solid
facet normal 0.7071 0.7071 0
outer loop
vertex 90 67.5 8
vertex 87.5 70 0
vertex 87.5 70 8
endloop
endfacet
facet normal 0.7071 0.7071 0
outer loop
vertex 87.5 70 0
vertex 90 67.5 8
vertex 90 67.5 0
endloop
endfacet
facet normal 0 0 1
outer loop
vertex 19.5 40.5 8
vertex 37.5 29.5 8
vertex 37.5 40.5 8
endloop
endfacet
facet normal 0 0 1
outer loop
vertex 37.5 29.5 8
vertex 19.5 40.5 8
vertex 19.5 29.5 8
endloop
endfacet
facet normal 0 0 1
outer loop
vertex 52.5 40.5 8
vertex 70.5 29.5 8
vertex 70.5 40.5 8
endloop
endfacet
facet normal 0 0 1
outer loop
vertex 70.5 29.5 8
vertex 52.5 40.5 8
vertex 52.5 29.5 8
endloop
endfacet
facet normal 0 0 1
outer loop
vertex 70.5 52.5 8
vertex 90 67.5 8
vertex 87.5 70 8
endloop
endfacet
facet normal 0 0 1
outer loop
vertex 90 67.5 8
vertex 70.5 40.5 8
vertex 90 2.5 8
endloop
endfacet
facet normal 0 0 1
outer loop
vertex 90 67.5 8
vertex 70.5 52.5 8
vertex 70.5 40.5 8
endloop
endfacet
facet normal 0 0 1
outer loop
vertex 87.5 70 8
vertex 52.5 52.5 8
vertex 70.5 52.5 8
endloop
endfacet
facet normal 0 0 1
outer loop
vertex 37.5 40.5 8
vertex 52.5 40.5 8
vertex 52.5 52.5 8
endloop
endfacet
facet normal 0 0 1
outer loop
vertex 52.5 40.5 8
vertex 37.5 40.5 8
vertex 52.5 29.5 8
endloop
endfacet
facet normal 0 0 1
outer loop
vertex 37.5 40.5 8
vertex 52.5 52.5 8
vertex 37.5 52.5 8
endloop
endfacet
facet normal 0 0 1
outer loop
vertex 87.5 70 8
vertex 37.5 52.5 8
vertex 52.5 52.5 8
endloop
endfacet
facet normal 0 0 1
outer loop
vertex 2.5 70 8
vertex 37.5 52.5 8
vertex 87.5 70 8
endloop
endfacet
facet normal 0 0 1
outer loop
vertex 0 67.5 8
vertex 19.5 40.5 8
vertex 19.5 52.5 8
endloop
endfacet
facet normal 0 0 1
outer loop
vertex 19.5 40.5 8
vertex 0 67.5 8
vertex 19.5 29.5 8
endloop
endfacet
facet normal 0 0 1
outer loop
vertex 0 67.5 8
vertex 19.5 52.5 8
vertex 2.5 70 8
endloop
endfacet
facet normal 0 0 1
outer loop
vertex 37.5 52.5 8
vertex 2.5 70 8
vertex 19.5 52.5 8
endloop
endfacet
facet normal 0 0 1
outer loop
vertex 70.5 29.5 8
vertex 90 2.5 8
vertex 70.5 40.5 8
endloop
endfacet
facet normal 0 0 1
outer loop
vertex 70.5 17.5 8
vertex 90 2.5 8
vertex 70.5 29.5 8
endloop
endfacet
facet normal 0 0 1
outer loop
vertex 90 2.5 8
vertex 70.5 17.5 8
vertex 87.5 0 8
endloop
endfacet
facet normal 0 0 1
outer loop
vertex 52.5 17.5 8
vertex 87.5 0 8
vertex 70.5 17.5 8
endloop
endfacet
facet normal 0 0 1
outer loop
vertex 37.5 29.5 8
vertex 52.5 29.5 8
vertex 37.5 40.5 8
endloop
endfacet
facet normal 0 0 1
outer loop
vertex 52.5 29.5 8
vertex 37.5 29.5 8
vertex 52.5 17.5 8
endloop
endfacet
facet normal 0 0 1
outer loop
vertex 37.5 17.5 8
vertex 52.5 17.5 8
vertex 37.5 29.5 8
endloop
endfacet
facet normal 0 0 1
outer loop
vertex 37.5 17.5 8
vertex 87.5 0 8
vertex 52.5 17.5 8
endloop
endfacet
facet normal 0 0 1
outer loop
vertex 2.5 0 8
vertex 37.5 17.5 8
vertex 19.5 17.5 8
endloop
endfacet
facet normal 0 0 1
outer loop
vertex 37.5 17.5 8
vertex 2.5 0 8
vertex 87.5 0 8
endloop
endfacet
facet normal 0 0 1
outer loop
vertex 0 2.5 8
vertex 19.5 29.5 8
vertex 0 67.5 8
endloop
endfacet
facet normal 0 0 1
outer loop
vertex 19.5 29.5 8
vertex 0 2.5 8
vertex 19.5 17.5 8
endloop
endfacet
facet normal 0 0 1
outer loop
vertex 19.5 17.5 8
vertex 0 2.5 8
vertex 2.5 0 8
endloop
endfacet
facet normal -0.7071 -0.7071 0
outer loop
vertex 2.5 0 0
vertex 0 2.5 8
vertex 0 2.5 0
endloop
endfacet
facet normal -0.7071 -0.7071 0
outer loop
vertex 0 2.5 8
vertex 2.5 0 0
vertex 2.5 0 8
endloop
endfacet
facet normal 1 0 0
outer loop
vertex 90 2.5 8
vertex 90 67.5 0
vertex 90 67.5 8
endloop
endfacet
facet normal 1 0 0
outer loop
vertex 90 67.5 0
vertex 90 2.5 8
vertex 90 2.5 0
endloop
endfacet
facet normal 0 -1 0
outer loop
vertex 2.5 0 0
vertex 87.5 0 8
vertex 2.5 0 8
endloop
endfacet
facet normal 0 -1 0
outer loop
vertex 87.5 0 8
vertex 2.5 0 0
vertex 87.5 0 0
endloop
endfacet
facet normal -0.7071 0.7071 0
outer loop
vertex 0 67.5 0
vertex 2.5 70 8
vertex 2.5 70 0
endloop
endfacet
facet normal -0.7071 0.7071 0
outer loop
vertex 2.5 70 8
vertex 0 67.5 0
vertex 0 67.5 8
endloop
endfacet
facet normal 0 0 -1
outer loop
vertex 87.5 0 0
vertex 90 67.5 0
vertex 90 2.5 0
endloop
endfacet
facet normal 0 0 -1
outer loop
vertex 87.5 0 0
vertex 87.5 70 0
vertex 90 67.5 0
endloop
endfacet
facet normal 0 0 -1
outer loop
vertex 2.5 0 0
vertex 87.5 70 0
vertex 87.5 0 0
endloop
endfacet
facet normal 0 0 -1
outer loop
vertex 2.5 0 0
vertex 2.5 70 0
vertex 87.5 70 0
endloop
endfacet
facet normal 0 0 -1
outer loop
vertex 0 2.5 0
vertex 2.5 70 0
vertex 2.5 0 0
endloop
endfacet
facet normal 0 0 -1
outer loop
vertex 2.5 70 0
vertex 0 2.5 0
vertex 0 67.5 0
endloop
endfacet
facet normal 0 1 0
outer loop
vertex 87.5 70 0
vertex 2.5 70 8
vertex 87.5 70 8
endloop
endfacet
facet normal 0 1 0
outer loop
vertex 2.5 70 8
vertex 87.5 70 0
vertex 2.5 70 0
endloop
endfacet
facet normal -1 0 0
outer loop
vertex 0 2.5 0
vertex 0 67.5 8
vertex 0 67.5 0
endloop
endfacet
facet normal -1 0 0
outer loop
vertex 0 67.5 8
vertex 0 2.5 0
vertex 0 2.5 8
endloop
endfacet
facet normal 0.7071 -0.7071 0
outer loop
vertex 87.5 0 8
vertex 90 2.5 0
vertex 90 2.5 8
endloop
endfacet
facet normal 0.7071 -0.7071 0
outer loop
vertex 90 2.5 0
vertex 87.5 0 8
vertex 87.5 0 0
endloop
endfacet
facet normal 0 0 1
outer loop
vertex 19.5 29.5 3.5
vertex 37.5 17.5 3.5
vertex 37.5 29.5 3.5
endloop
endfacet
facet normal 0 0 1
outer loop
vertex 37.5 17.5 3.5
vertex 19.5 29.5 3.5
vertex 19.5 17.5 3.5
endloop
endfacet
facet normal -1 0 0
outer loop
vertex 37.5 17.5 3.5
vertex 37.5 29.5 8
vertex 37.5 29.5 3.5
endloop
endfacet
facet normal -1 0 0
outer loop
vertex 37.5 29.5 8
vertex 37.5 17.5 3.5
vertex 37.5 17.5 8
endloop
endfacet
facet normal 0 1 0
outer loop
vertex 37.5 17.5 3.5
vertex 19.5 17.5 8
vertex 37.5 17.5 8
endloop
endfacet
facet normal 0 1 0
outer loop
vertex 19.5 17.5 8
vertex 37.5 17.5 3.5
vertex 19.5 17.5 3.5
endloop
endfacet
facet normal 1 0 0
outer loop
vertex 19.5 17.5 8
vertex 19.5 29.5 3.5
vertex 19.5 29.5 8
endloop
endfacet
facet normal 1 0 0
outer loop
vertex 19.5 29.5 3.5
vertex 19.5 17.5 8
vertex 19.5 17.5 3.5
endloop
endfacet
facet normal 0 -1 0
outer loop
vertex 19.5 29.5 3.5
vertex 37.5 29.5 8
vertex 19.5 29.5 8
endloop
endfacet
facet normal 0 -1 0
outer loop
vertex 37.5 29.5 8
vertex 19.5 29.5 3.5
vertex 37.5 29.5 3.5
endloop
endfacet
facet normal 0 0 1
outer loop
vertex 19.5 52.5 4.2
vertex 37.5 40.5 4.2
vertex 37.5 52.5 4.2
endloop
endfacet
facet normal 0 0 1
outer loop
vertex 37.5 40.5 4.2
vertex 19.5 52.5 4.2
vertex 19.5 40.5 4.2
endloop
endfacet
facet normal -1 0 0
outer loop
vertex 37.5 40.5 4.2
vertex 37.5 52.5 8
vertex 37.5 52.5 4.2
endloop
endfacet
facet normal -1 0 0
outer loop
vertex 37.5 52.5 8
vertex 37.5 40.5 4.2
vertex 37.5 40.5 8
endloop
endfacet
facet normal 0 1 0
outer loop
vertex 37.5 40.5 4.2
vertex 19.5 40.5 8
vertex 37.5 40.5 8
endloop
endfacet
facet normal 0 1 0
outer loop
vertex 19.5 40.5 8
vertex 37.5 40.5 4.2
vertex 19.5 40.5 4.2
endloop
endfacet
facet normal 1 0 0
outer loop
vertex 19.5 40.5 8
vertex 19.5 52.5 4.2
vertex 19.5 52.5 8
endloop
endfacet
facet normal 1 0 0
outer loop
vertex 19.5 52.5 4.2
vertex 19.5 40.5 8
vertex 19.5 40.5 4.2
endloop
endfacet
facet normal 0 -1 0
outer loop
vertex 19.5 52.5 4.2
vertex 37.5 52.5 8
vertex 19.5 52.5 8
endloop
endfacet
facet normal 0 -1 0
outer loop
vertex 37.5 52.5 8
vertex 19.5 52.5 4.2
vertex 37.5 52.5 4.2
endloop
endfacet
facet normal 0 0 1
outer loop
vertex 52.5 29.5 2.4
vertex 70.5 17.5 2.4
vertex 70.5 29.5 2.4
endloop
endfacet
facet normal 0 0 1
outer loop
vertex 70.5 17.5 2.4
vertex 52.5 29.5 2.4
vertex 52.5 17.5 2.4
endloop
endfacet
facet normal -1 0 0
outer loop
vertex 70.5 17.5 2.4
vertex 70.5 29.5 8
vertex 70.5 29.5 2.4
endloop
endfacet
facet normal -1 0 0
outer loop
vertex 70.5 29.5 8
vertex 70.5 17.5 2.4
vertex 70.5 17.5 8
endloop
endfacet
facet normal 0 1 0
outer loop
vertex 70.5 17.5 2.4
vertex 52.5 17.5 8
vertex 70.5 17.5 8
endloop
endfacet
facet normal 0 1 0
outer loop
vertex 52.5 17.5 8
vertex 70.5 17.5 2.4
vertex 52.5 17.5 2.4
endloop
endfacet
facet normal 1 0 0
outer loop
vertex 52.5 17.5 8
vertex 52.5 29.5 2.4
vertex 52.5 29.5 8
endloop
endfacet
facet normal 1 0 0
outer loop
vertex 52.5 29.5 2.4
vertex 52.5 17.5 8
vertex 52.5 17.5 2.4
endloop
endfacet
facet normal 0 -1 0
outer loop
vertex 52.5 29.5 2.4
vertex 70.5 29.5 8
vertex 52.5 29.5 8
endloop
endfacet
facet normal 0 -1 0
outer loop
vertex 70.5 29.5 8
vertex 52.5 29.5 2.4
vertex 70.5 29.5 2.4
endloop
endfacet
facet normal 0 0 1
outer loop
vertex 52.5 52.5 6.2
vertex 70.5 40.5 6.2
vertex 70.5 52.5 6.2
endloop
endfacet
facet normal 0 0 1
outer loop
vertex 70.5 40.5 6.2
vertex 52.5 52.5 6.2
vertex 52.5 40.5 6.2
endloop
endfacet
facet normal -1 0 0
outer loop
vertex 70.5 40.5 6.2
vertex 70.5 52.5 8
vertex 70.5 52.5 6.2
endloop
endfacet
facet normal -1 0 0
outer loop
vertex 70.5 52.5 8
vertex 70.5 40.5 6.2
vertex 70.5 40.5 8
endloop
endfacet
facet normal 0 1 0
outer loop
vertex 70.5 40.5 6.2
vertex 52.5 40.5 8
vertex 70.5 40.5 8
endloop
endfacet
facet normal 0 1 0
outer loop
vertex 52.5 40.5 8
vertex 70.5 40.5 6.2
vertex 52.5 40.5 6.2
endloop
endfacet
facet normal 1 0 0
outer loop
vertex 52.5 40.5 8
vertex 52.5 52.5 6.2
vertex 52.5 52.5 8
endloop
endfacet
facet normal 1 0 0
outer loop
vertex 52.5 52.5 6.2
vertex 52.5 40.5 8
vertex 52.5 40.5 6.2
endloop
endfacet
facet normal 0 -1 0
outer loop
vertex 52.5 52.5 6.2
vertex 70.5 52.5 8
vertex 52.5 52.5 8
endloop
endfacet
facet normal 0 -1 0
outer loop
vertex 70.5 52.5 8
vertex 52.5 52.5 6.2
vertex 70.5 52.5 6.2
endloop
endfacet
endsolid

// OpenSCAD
$fn = 32;

// ----------------------------------------------------------------------
// Windowed plate: 4 voids, 90 x 70 x 8 mm
// ----------------------------------------------------------------------

// --- parameters (mm) ---
plate_l = 90;             // plate length, X
plate_w = 70;             // plate width, Y
plate_t = 8;              // plate thickness, Z
edge_margin = 12;         // wall from the plate edge to any window
win_l = 18;               // pocket length
win_w = 12;               // pocket width
pitch_x = 33;             // grid pitch along X
pitch_y = 23;             // grid pitch along Y
depth_1 = 4.5;            // depth of void 1 (full thickness = through)
depth_2 = 3.8;            // depth of void 2 (full thickness = through)
depth_3 = 5.6;            // depth of void 3 (full thickness = through)
depth_4 = 1.8;            // depth of void 4 (full thickness = through)
corner_c = 2.5;           // corner chamfer of the plate

profile = [[2.5, 0], [87.5, 0], [90, 2.5], [90, 67.5], [87.5, 70], [2.5, 70], [0, 67.5], [0, 2.5]];  // primary outline, 8 points, counter clockwise
void_1 = [[19.5, 17.5], [37.5, 17.5], [37.5, 29.5], [19.5, 29.5]];  // pocket at grid node 0,0, 4 points
void_2 = [[19.5, 40.5], [37.5, 40.5], [37.5, 52.5], [19.5, 52.5]];  // pocket at grid node 0,1, 4 points
void_3 = [[52.5, 17.5], [70.5, 17.5], [70.5, 29.5], [52.5, 29.5]];  // pocket at grid node 1,0, 4 points
void_4 = [[52.5, 40.5], [70.5, 40.5], [70.5, 52.5], [52.5, 52.5]];  // pocket at grid node 1,1, 4 points

// --- the one profile operation ---
difference() {
  linear_extrude(height = plate_t) polygon(points = profile);
  translate([0, 0, plate_t - depth_1])
    linear_extrude(height = depth_1 + 1) polygon(points = void_1);
  translate([0, 0, plate_t - depth_2])
    linear_extrude(height = depth_2 + 1) polygon(points = void_2);
  translate([0, 0, plate_t - depth_3])
    linear_extrude(height = depth_3 + 1) polygon(points = void_3);
  translate([0, 0, plate_t - depth_4])
    linear_extrude(height = depth_4 + 1) polygon(points = void_4);
}
